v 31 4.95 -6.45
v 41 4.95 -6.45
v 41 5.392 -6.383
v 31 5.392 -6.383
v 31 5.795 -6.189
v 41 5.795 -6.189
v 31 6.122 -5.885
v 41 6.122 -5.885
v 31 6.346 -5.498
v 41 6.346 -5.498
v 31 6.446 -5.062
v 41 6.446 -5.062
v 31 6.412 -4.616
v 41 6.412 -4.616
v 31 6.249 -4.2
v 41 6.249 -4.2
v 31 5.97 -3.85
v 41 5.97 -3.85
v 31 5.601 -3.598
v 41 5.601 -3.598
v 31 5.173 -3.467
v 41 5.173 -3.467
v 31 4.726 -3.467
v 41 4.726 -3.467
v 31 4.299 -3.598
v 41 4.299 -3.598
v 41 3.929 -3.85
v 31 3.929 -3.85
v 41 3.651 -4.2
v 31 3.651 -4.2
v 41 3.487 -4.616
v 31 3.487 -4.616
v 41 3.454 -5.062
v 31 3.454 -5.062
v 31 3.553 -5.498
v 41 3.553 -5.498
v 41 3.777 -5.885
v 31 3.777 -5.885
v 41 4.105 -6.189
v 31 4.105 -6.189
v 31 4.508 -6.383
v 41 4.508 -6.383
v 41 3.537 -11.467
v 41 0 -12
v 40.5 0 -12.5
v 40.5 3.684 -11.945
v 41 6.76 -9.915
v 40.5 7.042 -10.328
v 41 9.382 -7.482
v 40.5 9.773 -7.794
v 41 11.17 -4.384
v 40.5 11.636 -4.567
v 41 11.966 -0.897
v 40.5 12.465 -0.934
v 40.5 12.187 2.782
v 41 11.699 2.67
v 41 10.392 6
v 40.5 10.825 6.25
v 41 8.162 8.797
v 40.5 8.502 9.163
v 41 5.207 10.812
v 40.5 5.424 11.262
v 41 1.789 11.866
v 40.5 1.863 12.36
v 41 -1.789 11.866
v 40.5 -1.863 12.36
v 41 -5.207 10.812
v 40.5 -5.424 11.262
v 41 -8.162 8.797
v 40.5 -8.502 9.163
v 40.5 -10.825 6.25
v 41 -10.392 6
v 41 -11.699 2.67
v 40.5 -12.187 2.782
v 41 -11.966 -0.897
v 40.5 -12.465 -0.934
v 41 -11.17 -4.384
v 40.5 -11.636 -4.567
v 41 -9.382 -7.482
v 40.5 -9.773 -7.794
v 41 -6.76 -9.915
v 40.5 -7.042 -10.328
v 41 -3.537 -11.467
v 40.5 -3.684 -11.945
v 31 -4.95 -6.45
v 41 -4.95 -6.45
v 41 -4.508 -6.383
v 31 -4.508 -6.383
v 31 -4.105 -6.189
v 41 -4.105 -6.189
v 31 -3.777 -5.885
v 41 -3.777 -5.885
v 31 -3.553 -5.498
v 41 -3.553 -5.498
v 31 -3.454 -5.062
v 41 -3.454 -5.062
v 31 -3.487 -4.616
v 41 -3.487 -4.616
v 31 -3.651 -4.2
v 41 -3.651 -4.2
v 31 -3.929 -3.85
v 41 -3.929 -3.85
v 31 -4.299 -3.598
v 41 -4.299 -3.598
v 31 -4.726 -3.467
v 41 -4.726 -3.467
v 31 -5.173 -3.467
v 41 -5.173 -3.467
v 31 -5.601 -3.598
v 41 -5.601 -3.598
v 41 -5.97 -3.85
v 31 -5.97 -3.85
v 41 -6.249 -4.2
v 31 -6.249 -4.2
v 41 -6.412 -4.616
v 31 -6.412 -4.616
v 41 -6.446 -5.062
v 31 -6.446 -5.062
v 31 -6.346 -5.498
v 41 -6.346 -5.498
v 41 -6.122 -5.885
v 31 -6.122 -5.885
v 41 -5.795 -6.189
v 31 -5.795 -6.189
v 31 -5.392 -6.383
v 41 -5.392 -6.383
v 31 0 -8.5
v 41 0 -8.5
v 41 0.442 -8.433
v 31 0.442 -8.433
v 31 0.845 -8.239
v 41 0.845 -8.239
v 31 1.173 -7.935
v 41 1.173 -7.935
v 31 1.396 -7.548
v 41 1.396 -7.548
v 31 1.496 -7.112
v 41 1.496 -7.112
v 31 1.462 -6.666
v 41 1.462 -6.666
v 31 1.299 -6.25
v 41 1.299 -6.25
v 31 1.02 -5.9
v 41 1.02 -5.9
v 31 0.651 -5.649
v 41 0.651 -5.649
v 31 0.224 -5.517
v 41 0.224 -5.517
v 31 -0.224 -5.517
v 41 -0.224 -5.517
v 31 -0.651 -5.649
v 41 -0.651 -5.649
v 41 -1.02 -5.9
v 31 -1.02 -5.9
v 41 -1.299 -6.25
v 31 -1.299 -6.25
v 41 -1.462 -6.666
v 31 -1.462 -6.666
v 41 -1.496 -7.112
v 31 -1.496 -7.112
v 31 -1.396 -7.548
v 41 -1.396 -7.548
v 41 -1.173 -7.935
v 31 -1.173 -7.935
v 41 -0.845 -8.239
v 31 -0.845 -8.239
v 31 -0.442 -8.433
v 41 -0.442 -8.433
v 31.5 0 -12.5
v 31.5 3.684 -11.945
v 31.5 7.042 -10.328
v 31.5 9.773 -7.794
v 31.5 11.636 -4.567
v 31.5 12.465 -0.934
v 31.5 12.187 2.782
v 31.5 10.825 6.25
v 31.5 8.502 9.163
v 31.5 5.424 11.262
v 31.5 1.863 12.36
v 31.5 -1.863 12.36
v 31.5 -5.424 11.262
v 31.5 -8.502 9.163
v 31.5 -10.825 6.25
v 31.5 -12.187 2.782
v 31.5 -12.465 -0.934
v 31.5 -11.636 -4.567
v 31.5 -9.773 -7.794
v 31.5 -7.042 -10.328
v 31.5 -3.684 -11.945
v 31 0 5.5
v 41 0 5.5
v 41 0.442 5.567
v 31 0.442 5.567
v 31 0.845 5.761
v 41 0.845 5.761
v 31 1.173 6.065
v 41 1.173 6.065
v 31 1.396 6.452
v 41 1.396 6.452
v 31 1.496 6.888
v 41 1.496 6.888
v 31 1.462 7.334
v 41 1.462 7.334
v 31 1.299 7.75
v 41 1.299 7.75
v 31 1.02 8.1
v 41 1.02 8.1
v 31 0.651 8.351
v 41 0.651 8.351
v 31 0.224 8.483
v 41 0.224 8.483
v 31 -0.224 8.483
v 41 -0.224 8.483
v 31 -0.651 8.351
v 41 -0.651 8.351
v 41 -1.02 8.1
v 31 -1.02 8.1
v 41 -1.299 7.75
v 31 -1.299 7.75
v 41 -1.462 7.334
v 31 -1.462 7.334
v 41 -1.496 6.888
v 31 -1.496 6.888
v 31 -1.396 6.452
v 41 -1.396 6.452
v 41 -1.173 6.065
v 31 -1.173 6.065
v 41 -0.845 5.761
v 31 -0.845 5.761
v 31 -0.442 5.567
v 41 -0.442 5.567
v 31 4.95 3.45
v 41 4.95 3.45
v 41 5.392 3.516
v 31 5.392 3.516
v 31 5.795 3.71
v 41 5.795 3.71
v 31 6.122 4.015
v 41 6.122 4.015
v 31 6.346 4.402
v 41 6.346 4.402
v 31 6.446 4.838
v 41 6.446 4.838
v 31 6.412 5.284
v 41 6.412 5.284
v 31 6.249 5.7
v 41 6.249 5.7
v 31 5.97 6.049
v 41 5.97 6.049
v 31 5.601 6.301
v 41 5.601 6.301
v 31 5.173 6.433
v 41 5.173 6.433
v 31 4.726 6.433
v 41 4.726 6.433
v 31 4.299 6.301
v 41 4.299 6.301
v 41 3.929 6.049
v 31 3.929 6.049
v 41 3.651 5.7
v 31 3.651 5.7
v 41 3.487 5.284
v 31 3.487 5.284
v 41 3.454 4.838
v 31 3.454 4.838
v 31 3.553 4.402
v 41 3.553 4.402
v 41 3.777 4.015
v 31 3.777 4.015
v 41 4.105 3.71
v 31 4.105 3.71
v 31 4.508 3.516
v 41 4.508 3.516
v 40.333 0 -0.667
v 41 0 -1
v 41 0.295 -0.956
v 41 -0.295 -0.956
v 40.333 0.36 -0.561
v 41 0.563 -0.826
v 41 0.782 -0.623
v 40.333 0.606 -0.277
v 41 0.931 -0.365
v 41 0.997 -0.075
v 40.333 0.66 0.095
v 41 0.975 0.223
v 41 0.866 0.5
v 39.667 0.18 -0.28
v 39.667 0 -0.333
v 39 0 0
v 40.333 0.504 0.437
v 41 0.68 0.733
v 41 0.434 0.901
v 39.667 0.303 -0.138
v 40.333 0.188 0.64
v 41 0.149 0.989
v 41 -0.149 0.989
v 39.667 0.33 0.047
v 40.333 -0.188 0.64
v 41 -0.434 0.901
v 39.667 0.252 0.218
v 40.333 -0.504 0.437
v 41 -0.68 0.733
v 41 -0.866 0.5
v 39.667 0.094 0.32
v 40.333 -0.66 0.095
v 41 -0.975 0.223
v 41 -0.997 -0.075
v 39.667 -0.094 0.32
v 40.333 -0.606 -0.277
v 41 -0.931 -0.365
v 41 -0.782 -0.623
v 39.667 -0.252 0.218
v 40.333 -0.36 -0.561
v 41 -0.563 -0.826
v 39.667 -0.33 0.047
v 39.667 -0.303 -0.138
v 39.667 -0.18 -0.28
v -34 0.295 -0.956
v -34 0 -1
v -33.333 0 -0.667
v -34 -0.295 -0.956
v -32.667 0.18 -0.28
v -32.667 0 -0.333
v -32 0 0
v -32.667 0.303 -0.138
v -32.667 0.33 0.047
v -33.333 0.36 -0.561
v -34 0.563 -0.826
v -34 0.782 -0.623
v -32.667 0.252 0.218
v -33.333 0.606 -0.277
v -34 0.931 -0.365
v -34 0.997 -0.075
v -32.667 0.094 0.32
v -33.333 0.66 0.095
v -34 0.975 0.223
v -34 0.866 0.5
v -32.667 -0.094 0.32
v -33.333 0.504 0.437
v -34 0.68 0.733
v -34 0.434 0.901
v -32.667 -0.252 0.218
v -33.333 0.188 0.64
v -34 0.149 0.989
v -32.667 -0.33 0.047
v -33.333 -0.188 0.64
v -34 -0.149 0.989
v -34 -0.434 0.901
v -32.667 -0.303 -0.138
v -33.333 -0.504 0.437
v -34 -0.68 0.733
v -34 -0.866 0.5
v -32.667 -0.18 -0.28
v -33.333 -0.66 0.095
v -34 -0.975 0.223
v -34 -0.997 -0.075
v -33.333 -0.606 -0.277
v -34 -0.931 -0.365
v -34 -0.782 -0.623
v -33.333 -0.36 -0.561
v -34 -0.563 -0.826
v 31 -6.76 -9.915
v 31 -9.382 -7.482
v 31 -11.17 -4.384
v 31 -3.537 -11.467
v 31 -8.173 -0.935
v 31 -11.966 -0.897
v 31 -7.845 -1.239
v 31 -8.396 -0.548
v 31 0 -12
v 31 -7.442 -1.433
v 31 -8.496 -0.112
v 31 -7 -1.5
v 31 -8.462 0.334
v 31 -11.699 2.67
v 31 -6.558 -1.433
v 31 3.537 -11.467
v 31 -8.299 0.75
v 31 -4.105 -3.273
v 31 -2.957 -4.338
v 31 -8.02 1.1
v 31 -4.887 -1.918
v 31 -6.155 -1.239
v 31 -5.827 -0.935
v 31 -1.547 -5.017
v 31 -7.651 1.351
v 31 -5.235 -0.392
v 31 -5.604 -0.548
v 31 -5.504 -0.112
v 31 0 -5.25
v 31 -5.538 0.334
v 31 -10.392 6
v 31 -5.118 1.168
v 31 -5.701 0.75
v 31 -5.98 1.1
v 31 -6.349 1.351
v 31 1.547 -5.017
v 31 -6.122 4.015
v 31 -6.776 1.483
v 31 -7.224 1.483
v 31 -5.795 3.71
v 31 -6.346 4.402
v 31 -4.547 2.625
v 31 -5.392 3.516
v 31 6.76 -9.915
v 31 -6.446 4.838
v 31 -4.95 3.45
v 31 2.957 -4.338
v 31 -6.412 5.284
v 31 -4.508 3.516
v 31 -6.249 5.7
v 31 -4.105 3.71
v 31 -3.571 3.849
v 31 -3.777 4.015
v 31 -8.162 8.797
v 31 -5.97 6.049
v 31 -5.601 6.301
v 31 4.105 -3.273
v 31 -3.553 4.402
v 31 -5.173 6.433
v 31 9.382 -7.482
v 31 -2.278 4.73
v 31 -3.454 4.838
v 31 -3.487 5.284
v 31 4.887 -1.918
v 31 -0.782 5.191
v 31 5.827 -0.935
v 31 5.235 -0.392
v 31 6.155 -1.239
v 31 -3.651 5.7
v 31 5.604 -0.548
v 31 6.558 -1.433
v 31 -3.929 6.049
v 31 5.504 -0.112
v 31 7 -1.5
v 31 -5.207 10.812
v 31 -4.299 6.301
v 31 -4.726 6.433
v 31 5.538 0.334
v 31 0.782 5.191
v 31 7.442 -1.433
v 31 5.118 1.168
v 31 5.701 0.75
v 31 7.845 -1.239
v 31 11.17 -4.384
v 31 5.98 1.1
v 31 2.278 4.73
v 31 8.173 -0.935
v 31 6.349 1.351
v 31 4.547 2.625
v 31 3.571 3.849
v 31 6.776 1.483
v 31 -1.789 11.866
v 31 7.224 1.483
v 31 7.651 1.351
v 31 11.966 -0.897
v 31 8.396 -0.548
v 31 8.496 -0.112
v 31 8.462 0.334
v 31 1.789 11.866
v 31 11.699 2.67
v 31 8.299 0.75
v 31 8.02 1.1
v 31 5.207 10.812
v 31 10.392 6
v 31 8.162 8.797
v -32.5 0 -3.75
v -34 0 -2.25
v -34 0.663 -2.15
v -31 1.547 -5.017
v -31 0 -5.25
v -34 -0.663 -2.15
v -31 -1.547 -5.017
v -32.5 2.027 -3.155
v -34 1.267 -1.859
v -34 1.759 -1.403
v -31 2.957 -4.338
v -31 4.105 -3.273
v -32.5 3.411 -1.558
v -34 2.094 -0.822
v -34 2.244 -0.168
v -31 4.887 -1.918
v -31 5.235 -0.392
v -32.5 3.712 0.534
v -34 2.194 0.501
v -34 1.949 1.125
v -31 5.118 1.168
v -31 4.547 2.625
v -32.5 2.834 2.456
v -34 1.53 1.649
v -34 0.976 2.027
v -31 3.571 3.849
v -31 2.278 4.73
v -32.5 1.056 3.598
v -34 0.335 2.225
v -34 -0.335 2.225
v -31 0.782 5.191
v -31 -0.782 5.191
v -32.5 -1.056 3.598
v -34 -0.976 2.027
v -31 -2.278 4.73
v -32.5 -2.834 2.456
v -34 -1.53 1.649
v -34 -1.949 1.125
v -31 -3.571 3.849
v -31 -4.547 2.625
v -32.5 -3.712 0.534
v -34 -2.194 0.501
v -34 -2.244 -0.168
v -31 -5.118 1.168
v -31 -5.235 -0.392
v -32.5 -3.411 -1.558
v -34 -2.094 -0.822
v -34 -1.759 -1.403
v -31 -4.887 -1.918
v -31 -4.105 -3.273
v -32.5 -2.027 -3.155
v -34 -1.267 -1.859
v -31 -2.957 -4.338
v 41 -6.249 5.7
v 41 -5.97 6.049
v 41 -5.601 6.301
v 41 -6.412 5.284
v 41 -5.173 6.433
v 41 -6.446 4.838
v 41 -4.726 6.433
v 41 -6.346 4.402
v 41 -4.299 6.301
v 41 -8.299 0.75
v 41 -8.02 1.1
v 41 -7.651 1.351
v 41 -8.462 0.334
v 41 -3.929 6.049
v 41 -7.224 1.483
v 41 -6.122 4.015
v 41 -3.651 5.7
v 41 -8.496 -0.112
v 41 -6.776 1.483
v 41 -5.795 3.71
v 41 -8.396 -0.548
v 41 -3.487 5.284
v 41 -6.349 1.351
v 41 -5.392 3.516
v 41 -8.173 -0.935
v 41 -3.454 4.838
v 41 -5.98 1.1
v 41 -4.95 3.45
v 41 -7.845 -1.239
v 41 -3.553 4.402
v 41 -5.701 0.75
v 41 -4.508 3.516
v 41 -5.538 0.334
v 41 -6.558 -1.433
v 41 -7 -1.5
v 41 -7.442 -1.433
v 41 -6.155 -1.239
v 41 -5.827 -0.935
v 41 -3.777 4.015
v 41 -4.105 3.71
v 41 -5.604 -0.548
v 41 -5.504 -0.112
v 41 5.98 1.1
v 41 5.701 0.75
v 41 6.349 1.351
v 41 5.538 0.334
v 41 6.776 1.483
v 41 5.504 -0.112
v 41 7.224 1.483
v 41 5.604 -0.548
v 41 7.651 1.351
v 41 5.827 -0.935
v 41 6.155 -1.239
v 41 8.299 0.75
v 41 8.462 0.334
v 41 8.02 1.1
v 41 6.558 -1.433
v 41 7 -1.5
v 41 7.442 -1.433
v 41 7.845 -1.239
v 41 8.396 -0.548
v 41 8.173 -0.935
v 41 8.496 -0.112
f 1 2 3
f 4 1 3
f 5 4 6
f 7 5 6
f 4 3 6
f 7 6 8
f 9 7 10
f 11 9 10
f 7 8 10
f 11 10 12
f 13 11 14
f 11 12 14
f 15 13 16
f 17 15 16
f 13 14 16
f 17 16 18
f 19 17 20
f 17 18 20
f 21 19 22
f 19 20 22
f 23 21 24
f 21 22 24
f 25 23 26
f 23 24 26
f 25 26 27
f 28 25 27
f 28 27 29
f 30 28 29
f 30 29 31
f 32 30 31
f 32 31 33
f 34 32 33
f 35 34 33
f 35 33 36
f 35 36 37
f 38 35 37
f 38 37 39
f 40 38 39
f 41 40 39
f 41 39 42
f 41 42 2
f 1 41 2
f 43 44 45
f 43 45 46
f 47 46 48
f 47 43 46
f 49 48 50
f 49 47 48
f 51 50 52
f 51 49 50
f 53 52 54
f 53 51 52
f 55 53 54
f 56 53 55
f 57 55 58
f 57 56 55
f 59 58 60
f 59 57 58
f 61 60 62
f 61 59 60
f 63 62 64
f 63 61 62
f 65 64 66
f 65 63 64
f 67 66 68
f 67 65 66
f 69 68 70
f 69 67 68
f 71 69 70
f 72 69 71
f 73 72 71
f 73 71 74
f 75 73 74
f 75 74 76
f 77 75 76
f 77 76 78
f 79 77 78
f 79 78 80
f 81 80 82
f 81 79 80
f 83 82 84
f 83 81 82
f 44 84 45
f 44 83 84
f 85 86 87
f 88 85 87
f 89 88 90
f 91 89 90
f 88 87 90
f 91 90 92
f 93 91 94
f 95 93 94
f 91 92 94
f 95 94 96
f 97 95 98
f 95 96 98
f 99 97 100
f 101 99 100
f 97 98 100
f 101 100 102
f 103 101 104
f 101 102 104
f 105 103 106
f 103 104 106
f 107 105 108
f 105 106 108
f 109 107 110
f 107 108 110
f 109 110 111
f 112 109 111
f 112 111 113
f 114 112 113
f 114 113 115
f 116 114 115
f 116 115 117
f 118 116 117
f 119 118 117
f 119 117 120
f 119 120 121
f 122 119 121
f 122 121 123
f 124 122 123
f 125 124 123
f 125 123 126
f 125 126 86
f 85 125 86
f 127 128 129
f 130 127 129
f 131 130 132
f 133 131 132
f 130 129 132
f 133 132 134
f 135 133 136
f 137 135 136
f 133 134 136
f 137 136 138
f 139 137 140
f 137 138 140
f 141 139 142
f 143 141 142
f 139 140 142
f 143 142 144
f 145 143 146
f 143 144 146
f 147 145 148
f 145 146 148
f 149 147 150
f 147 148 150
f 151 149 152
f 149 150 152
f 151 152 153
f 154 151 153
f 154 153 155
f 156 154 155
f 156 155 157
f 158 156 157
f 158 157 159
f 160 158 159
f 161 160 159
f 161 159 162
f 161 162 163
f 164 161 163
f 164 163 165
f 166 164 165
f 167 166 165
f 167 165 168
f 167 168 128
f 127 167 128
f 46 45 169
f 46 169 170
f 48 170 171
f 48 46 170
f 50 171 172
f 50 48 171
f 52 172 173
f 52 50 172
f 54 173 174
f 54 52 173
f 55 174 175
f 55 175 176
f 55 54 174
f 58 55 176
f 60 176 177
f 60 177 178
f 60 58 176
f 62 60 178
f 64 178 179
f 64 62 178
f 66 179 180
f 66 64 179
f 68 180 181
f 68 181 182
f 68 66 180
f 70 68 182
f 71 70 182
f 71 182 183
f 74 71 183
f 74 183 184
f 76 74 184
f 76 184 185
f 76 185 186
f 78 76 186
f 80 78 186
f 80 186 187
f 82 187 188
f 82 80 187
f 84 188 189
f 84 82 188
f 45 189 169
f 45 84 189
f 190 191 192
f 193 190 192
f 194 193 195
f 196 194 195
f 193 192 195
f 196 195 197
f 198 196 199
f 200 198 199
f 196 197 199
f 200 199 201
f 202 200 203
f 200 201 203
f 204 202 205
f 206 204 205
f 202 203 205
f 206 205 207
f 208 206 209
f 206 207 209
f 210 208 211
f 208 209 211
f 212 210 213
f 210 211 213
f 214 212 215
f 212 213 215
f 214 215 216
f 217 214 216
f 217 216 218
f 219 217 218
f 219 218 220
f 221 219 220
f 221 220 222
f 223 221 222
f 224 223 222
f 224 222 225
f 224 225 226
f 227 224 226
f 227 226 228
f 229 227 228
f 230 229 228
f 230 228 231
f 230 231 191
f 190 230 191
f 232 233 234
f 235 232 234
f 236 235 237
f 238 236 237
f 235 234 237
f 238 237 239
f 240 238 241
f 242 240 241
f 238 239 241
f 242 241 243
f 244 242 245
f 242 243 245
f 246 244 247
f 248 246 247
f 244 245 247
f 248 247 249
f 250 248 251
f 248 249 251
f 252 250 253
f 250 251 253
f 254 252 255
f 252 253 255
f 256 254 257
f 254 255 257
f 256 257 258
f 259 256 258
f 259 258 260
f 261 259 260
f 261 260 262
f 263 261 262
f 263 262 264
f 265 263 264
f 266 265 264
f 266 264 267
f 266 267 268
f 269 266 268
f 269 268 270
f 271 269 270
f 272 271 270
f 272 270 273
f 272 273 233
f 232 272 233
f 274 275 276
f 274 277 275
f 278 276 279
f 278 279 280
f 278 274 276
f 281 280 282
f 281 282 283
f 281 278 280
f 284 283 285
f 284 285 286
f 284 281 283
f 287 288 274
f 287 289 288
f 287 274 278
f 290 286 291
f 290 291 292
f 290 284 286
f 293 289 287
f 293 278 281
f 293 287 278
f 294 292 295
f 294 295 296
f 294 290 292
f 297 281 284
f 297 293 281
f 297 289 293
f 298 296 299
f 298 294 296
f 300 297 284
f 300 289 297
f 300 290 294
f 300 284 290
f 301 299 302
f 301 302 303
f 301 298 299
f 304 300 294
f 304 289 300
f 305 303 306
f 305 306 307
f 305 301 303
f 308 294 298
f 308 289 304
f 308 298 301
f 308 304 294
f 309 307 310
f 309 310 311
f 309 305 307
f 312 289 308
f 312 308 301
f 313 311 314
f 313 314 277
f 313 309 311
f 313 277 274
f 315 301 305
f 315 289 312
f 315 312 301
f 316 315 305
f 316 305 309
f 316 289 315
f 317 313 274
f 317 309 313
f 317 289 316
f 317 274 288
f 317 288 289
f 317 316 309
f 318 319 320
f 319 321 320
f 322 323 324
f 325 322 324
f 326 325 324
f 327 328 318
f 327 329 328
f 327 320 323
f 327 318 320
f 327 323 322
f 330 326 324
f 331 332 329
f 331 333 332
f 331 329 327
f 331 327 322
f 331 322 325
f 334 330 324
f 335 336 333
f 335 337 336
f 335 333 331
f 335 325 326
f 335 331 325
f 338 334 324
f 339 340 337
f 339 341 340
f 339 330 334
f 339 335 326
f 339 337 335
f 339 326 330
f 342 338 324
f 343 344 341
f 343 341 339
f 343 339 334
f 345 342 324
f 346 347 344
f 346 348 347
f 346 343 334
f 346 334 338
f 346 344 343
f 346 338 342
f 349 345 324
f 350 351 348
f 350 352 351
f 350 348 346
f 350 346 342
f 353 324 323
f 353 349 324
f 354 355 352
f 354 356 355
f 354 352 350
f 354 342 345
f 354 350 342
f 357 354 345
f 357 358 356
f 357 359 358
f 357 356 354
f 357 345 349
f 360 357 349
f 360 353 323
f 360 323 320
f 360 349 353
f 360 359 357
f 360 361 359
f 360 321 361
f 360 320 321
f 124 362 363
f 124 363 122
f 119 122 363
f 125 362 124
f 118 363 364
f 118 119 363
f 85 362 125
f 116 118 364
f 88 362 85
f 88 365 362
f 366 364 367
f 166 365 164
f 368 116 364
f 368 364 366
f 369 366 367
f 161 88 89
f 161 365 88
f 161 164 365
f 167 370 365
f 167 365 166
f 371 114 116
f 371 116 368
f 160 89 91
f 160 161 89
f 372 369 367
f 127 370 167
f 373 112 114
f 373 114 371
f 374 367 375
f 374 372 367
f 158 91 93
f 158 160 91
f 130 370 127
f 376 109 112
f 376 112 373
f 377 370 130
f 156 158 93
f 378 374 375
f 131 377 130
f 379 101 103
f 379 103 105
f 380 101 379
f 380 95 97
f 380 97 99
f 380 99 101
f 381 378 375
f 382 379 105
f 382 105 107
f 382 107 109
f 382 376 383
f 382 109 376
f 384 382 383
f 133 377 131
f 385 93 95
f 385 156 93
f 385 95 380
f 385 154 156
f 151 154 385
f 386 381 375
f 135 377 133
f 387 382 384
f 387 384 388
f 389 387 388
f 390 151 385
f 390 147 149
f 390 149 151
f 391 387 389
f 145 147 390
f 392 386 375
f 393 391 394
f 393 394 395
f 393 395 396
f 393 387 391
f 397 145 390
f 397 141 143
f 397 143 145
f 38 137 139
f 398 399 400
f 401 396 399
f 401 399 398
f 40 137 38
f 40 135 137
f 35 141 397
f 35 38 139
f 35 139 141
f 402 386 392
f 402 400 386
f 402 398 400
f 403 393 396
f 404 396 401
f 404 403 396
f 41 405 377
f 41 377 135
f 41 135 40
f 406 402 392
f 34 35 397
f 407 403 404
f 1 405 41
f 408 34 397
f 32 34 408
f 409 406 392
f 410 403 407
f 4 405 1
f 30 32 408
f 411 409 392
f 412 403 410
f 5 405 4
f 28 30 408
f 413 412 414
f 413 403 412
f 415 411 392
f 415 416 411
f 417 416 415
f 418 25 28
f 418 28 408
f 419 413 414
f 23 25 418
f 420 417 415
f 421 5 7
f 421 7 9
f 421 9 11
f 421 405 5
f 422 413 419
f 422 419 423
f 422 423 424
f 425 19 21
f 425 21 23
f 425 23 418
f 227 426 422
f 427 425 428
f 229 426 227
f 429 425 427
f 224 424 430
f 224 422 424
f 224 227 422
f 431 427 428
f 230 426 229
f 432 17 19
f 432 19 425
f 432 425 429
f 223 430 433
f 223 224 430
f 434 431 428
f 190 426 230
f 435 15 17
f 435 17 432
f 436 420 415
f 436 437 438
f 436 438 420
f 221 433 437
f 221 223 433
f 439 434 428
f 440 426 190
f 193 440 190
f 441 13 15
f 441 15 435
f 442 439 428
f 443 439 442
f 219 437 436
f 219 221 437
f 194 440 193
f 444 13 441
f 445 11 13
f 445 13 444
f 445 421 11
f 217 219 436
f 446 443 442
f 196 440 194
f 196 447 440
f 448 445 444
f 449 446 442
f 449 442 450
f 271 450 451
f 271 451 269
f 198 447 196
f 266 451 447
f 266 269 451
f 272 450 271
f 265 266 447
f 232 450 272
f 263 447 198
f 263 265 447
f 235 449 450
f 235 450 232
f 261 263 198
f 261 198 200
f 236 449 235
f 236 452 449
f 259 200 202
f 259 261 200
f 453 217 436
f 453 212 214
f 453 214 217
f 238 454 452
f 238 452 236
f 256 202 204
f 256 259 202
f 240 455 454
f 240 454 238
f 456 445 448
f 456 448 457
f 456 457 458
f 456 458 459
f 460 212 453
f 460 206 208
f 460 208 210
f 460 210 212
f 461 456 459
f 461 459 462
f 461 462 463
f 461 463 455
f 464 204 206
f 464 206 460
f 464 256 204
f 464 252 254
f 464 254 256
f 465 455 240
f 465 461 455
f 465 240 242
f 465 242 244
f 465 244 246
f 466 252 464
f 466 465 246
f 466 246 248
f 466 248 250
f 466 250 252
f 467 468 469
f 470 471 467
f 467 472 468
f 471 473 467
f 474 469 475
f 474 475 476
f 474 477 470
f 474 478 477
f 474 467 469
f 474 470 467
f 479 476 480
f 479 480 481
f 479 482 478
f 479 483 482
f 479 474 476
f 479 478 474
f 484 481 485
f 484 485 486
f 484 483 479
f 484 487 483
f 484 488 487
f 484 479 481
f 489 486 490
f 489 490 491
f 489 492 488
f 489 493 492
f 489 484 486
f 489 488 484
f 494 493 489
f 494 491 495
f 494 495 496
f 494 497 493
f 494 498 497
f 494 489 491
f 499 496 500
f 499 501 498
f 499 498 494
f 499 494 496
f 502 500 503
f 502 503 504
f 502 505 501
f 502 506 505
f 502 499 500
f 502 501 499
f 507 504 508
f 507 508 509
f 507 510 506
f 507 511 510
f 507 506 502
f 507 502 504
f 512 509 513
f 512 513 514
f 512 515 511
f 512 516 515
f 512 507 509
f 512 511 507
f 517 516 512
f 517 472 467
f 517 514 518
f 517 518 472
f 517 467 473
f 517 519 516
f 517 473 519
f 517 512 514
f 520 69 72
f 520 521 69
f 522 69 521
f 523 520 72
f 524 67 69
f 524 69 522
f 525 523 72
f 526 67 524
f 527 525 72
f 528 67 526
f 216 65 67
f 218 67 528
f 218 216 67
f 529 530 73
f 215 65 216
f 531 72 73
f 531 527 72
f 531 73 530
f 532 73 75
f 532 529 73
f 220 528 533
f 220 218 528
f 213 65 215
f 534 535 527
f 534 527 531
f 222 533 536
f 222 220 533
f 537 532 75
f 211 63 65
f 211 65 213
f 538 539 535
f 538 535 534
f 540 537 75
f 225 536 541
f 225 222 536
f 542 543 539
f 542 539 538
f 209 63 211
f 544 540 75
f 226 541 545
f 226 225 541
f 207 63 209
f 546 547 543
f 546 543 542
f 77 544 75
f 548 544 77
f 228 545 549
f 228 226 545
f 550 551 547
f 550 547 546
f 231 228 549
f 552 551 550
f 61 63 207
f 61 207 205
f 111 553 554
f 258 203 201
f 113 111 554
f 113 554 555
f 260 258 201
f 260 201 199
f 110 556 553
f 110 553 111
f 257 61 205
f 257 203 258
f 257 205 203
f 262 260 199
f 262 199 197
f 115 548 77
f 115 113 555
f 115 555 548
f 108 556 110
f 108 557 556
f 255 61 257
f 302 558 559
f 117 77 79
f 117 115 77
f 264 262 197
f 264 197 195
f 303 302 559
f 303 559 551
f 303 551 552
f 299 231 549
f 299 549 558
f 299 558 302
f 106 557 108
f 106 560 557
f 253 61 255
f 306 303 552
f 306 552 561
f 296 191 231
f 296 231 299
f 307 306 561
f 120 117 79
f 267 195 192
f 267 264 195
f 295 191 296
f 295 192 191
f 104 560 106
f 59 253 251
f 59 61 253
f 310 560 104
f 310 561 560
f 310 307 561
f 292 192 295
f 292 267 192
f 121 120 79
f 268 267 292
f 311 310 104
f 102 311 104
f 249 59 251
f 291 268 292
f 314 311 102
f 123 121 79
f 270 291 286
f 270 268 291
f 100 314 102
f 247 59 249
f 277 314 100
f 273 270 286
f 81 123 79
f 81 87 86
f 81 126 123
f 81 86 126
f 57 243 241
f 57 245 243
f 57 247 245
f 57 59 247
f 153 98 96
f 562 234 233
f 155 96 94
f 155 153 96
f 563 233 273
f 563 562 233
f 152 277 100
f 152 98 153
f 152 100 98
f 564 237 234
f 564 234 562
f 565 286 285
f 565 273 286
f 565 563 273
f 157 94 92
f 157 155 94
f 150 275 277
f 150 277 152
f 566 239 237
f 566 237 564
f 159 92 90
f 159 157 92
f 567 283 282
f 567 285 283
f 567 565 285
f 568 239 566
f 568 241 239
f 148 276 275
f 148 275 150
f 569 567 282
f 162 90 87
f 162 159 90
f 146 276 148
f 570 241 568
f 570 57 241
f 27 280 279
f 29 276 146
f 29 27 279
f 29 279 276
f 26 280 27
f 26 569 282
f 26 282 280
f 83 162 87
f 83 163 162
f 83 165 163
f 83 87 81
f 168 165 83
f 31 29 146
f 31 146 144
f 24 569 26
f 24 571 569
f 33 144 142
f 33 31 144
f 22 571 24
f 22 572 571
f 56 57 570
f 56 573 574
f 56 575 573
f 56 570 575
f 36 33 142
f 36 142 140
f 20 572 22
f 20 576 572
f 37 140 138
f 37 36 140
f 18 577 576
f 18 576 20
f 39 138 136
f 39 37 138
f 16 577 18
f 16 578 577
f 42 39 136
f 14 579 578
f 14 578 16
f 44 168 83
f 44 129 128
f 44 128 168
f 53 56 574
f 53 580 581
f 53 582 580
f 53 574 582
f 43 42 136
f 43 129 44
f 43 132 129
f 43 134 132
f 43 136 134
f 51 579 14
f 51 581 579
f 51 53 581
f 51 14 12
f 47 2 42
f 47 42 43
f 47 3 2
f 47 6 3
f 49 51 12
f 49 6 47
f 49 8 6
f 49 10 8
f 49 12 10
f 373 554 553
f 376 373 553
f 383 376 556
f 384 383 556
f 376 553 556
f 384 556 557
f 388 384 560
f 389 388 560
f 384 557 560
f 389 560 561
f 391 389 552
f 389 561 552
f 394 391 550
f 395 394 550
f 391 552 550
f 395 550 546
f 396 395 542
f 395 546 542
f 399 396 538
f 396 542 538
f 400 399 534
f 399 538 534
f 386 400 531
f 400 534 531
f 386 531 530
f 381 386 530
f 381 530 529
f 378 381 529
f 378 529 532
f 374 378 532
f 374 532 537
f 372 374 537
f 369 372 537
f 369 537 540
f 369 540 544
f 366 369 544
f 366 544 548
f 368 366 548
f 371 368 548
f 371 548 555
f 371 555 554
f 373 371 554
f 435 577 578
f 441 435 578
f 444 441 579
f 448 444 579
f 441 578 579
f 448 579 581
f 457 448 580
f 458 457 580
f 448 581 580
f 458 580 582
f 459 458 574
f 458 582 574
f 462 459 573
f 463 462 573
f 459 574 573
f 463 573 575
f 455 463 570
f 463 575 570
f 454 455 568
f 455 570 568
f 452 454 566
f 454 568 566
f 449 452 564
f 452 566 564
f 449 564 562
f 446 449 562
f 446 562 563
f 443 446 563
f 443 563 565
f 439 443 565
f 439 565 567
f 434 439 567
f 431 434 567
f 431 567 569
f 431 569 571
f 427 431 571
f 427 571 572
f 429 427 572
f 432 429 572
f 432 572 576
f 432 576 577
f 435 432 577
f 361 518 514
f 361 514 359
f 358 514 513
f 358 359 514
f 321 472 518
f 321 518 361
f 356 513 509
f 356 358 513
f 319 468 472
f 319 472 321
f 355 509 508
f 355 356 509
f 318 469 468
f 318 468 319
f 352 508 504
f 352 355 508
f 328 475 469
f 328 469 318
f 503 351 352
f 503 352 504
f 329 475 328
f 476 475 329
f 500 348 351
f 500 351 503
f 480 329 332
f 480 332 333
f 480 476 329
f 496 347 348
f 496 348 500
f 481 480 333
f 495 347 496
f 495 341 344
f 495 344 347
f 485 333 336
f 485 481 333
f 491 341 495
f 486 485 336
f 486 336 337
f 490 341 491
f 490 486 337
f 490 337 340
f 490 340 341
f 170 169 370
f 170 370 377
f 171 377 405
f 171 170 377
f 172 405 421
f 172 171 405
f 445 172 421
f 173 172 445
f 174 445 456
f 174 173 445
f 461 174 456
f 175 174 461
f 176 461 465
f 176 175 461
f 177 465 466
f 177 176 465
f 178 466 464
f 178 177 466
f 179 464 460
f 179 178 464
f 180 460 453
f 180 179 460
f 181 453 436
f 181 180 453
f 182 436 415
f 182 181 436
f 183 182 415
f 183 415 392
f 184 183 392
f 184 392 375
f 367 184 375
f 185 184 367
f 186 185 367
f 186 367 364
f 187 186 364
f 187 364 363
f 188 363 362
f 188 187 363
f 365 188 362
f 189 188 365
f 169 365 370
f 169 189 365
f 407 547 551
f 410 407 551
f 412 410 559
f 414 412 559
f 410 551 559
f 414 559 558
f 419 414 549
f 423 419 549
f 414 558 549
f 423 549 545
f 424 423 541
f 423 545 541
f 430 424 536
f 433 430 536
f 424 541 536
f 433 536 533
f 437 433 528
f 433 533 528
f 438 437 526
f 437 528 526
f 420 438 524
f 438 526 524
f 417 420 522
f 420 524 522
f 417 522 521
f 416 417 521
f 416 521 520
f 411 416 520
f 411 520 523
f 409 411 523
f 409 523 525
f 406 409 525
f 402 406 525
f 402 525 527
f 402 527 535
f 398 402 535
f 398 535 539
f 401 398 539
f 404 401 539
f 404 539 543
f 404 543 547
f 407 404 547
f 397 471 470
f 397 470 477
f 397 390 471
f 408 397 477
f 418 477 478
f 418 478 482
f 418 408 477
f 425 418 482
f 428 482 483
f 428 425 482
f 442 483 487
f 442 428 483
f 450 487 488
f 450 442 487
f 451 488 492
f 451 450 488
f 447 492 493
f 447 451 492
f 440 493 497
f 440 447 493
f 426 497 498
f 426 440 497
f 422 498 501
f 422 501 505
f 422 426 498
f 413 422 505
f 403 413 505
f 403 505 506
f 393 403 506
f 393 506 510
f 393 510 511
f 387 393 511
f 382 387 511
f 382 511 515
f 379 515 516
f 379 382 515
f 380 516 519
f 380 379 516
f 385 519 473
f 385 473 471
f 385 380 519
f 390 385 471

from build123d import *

# Parameters (mm, degrees)
CHAMFER1_SIZE      = 0.5
SKETCH3_R          = 1.5
CUT_EXTRUDE1_DEPTH = 76


with BuildPart() as part:
    # Sketch2 → Revolve1 (revolve)
    with BuildSketch(Plane(origin=(0, 0, 0), x_dir=(1, 0, 0), z_dir=(0, 1, 0))):
        Polygon((-34, 1), (-34, 2.25), (-31, 5.25), (31, 5.25), (31, 12.5), (41, 12.5), (41, 1), (39, 0), (-32, 0), align=None)
    revolve(axis=Axis((-32, 0, 0), (1, 0, 0)))

    # Chamfer1
    chamfer1_edges = [part.edges().sort_by_distance(p)[0] for p in [
        (41, 0, 12.5),
        (31, 0, 12.5),
    ]]
    chamfer(chamfer1_edges, length=CHAMFER1_SIZE)

    # Sketch3 → Cut-Extrude1 (cut, through all)
    with BuildSketch(Plane(origin=(41, 0, 0), x_dir=(0, 0, -1), z_dir=(1, 0, 0))):
        with Locations((0, 7)):
            Circle(SKETCH3_R)
        with Locations((4.949747468, 4.949747468)):
            Circle(SKETCH3_R)
        with Locations((7, 0)):
            Circle(SKETCH3_R)
        with Locations((4.949747468, -4.949747468)):
            Circle(SKETCH3_R)
        with Locations((0, -7)):
            Circle(SKETCH3_R)
        with Locations((-4.949747468, -4.949747468)):
            Circle(SKETCH3_R)
        with Locations((-7, 0)):
            Circle(SKETCH3_R)
        with Locations((-4.949747468, 4.949747468)):
            Circle(SKETCH3_R)
    extrude(amount=-CUT_EXTRUDE1_DEPTH, mode=Mode.SUBTRACT)


solid = part.part
